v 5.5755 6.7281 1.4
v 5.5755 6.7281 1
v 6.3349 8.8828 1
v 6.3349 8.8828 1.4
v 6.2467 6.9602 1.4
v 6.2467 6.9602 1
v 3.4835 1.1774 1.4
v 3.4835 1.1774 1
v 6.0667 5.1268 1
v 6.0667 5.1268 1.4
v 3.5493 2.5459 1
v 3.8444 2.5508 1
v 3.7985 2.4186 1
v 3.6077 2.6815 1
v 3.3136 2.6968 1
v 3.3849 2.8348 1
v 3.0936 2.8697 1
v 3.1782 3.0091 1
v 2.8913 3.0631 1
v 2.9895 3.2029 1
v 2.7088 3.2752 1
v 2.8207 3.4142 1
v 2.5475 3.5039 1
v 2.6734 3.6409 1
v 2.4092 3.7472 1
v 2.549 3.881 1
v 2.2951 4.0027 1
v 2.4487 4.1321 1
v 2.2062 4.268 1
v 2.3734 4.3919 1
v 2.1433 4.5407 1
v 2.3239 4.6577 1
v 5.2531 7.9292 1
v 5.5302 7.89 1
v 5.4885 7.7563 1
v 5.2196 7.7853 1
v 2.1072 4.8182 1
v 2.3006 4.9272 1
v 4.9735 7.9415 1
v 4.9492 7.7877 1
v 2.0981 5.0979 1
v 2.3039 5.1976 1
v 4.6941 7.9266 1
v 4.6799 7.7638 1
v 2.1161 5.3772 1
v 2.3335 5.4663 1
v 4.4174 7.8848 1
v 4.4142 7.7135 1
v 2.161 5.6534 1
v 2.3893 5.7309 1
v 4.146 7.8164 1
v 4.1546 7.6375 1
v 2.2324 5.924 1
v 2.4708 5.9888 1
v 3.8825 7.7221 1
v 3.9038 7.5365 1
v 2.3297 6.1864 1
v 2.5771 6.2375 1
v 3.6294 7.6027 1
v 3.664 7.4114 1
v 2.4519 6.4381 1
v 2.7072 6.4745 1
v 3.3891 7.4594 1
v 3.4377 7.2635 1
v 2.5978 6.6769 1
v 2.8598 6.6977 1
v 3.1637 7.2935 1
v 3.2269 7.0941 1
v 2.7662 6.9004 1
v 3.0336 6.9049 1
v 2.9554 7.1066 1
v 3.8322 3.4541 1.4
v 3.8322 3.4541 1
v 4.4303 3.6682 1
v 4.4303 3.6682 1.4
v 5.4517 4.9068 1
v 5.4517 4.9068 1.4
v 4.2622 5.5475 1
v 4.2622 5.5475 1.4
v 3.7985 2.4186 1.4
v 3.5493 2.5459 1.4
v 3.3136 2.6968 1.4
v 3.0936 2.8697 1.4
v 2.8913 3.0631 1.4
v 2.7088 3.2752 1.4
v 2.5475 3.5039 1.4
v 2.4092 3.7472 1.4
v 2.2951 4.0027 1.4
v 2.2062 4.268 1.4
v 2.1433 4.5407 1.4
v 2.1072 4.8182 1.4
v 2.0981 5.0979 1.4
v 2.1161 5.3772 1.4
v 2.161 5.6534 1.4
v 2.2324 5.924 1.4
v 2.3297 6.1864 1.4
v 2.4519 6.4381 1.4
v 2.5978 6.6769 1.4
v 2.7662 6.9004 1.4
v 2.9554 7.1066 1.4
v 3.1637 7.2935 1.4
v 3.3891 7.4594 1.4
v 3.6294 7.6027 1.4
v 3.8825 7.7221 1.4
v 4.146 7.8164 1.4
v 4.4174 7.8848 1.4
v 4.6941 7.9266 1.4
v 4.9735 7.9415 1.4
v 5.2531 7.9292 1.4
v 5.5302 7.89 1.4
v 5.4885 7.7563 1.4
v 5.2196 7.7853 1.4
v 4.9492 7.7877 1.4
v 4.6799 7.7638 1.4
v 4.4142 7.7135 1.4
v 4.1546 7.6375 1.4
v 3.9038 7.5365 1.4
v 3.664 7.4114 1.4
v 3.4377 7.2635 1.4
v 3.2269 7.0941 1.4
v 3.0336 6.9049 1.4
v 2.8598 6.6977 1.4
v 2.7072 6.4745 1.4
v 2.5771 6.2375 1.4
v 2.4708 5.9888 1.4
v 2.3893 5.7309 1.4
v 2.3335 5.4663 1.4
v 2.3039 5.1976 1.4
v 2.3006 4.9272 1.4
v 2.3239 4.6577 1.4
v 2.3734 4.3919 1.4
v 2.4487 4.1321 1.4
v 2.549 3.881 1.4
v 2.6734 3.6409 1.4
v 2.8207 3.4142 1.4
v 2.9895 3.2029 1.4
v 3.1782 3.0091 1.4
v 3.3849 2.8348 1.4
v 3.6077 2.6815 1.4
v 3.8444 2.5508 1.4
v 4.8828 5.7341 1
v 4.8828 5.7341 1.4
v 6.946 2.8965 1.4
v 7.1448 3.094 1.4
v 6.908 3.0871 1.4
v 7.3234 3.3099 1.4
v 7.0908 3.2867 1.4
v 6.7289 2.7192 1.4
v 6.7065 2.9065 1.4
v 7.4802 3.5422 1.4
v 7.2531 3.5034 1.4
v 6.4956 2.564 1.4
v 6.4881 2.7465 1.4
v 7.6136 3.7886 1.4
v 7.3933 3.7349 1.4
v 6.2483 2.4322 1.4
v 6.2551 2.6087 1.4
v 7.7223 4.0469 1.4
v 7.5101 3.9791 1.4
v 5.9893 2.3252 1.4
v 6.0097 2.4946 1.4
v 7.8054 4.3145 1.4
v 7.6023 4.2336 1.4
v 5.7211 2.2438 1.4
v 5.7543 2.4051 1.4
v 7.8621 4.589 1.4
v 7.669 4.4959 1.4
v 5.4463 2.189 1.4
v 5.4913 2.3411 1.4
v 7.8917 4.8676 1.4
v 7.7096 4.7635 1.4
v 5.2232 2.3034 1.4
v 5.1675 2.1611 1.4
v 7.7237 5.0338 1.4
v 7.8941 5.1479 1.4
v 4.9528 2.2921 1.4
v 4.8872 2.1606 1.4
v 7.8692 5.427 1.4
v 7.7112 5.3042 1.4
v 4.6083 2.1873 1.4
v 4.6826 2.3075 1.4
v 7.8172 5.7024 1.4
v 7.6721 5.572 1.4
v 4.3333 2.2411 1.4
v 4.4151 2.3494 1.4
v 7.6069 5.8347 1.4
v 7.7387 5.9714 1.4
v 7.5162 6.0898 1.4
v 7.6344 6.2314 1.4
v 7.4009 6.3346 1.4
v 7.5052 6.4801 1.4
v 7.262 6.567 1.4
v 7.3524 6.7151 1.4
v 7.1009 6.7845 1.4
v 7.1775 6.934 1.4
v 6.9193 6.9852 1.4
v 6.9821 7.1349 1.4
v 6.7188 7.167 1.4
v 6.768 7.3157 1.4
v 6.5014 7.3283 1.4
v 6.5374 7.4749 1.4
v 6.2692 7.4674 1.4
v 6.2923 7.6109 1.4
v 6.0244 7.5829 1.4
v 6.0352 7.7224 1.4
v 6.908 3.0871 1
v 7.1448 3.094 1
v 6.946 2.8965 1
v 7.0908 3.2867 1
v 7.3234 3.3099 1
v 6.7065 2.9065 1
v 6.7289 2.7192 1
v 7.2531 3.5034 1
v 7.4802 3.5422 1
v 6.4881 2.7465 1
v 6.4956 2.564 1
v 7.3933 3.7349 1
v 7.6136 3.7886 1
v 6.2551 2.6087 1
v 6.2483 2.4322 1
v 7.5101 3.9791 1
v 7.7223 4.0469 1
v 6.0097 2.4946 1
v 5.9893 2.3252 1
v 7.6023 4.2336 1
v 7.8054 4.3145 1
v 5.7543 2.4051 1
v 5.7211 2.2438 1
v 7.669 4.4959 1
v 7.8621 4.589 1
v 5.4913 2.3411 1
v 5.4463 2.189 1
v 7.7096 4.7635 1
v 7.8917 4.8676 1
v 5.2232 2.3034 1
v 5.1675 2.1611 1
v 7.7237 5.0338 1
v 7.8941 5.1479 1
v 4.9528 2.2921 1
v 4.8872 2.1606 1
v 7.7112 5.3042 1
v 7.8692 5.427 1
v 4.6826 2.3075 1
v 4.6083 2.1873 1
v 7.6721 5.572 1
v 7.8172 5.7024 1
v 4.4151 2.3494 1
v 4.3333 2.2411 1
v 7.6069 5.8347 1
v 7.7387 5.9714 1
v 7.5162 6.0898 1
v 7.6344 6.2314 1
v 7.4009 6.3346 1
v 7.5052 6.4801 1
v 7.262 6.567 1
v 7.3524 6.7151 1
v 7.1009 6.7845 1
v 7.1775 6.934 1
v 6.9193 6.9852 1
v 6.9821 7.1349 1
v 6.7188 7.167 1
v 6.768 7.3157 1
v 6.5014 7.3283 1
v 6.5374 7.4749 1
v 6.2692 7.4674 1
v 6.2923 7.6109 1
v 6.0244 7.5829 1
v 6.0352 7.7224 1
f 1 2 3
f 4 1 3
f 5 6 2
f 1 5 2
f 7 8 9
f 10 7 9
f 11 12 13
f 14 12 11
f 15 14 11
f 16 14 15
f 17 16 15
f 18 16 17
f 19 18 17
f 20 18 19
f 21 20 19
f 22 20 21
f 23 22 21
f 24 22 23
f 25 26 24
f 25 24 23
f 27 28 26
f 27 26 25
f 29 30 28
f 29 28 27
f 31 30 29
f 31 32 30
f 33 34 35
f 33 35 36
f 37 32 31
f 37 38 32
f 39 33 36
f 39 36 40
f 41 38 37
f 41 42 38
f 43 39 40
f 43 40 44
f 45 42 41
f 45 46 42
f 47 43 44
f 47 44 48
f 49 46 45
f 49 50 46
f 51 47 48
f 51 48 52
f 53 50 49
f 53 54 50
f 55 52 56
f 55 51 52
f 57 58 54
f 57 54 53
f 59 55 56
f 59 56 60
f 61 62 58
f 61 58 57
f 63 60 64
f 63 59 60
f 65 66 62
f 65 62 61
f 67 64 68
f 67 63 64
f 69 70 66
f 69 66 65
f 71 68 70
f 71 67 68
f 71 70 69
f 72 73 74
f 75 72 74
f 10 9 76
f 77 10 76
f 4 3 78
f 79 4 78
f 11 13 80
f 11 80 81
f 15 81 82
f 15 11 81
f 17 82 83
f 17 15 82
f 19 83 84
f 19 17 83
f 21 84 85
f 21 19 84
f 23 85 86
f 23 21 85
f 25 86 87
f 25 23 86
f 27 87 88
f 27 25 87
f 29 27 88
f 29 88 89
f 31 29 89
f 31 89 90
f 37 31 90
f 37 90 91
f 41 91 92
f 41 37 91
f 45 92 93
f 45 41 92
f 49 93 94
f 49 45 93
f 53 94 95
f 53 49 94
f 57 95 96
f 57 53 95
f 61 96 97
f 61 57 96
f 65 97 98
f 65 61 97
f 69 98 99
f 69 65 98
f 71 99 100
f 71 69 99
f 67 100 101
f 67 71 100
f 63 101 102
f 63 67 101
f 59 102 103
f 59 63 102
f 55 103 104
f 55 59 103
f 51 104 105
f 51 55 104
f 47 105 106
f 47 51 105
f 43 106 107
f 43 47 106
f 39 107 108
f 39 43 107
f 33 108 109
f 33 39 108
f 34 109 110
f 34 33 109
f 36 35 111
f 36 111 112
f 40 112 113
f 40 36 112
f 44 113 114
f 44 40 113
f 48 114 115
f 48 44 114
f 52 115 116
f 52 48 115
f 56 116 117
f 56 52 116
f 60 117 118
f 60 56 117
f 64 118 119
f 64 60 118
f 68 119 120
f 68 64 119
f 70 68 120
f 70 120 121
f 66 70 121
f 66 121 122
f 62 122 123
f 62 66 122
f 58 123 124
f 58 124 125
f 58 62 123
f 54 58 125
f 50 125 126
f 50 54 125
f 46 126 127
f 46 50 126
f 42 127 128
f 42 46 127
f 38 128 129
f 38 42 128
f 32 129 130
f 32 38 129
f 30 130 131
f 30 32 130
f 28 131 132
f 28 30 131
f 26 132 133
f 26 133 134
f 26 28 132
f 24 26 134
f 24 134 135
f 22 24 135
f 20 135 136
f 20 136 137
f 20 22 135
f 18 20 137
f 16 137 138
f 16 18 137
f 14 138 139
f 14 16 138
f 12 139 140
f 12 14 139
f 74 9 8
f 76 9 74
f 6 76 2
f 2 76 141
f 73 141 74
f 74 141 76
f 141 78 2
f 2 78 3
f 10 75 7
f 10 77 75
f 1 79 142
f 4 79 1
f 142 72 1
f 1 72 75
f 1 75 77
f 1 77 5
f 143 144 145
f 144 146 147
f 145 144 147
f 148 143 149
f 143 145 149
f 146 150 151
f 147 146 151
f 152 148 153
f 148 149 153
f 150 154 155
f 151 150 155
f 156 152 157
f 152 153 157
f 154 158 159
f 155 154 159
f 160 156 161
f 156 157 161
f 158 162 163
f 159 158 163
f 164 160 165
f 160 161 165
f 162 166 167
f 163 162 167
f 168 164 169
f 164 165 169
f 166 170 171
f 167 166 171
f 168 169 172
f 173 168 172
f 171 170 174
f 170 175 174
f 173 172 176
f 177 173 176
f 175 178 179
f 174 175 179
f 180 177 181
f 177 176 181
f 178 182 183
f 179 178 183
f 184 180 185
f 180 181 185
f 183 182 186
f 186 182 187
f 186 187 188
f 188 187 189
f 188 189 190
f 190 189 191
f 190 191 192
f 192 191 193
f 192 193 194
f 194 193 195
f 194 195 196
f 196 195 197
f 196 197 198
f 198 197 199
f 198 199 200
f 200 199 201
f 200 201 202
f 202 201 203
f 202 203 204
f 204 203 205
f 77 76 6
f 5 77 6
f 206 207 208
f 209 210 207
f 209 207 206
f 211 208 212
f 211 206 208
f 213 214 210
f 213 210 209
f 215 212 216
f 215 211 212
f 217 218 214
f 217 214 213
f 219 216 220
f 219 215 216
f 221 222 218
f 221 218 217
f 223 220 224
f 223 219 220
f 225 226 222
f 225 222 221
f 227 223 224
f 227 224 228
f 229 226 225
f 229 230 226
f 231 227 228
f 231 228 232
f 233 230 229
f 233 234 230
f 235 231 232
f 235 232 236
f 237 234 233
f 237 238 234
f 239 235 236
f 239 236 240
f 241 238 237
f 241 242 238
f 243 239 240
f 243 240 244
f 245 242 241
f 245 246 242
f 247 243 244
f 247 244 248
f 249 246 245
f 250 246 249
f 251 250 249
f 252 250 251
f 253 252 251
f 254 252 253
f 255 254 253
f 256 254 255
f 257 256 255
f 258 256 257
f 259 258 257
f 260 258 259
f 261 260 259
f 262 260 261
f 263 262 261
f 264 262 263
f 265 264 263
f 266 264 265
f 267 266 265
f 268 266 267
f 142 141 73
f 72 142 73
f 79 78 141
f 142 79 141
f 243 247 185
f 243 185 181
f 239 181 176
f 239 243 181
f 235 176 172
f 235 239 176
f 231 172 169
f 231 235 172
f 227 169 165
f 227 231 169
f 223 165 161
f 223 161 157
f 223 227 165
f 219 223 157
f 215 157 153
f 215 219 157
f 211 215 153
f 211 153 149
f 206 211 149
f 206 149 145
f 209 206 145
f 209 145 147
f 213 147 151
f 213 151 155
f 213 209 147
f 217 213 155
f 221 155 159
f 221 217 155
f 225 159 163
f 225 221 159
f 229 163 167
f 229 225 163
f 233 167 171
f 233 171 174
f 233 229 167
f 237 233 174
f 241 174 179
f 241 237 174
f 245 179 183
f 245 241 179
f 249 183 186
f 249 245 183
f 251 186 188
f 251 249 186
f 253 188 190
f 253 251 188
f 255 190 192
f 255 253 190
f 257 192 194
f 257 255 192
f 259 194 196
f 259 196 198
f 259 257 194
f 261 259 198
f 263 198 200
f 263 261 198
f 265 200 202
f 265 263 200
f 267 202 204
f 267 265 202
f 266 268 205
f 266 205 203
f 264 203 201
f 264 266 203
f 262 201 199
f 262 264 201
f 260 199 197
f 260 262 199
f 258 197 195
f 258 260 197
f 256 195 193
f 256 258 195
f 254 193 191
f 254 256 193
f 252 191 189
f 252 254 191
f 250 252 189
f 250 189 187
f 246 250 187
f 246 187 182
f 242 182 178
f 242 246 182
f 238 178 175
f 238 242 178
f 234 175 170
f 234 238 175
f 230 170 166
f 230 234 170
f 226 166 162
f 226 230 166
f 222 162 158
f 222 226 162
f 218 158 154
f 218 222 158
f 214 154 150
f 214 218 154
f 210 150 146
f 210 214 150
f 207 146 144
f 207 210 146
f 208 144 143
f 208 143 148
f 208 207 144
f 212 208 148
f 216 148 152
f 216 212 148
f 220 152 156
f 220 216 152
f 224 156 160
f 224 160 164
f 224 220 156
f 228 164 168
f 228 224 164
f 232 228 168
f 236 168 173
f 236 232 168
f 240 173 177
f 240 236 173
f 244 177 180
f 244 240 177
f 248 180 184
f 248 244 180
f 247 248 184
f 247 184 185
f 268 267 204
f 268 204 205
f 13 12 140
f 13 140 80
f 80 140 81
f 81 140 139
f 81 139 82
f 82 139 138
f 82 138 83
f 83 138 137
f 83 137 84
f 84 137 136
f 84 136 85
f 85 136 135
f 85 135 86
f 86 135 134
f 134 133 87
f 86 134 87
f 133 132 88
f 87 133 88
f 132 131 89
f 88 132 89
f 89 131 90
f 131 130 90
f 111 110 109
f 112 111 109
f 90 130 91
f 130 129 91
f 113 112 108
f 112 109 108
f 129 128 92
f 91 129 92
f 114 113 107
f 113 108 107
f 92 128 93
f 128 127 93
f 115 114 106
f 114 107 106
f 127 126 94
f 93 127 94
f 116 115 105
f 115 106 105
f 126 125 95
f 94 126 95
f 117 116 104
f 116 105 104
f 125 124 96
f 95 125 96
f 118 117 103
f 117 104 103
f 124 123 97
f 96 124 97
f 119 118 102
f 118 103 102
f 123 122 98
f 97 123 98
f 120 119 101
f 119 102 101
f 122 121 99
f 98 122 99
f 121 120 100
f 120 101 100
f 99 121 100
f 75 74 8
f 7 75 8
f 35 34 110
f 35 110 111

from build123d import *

# Parameters (mm, degrees)
ESQUISSE1_W             = 10
ESQUISSE1_H             = 10
BOSS_EXTRU_1_DEPTH      = 1
BOSS_EXTRU_2_DEPTH      = 0.4
ESQUISSE3_W             = 12.280375392
ESQUISSE3_H             = 11.683913343
ENL_V_MAT_EXTRU_1_DEPTH = 1


with BuildPart() as part:
    # Esquisse1 → Boss.-Extru.1 (new body)
    with BuildSketch(Plane.XY):
        with Locations((5, 5)):
            Rectangle(ESQUISSE1_W, ESQUISSE1_H)
    extrude(amount=BOSS_EXTRU_1_DEPTH)

    # Esquisse2 → Boss.-Extru.2 (add)
    with BuildSketch(Plane.XY.offset(1)):
        Polygon((6.334931749, 8.882833414), (4.262184586, 5.547465589), (4.882830202, 5.734118598), (3.832245005, 3.454123577), (4.430340597, 3.668155532), (3.483509575, 1.17741408), (6.066659864, 5.126849848), (5.451682271, 4.906776572), (6.246715415, 6.960231429), (5.57547524, 6.728124462), align=None)
        with BuildLine():
            Line((5.530169771, 7.890023865), (5.488504184, 7.756335693))
            ThreePointArc((5.488504184, 7.756335693), (2.426904745, 5.860871802), (3.844411762, 2.55075876))
            Line((3.844411762, 2.55075876), (3.798492134, 2.418568254))
            ThreePointArc((3.798492134, 2.418568254), (2.232404609, 5.923983829), (5.530169771, 7.890023865))
        make_face()
        with BuildLine():
            Line((6.024442183, 7.582942033), (6.035237751, 7.722350143))
            ThreePointArc((6.035237751, 7.722350143), (7.767144688, 4.179700726), (4.333254025, 2.241077131))
            Line((4.333254025, 2.241077131), (4.415141932, 2.349442444))
            ThreePointArc((4.415141932, 2.349442444), (7.602289895, 4.23357455), (6.024442183, 7.582942033))
        make_face()
    extrude(amount=BOSS_EXTRU_2_DEPTH)

    # Esquisse3 → Enlèv. mat.-Extru.1 (cut)
    with BuildSketch(Plane(origin=(0, 0, 0), x_dir=(-1, 0, 0), z_dir=(0, 0, -1))):
        with Locations((-4.624490523, 5.133758282)):
            Rectangle(ESQUISSE3_W, ESQUISSE3_H)
    extrude(amount=-ENL_V_MAT_EXTRU_1_DEPTH, mode=Mode.SUBTRACT)


with BuildPart() as enl_v_mat_extru_1_piece_1:
    # of the separate pieces the step leaves, piece 1, a body of its own (enl_v_mat_extru_1_pieces)
    add(part.part.solids().sort_by_distance((6.334931749, 8.882833414, 1))[0])


with BuildPart() as enl_v_mat_extru_1_piece_2:
    # of the separate pieces the step leaves, piece 2, a body of its own (enl_v_mat_extru_1_pieces)
    add(part.part.solids().sort_by_distance((3.798492134, 2.418568254, 1))[0])


with BuildPart() as enl_v_mat_extru_1_piece_3:
    # of the separate pieces the step leaves, piece 3, a body of its own (enl_v_mat_extru_1_pieces)
    add(part.part.solids().sort_by_distance((6.035237751, 7.722350143, 1))[0])


solid = Compound([enl_v_mat_extru_1_piece_1.part, enl_v_mat_extru_1_piece_2.part, enl_v_mat_extru_1_piece_3.part])
